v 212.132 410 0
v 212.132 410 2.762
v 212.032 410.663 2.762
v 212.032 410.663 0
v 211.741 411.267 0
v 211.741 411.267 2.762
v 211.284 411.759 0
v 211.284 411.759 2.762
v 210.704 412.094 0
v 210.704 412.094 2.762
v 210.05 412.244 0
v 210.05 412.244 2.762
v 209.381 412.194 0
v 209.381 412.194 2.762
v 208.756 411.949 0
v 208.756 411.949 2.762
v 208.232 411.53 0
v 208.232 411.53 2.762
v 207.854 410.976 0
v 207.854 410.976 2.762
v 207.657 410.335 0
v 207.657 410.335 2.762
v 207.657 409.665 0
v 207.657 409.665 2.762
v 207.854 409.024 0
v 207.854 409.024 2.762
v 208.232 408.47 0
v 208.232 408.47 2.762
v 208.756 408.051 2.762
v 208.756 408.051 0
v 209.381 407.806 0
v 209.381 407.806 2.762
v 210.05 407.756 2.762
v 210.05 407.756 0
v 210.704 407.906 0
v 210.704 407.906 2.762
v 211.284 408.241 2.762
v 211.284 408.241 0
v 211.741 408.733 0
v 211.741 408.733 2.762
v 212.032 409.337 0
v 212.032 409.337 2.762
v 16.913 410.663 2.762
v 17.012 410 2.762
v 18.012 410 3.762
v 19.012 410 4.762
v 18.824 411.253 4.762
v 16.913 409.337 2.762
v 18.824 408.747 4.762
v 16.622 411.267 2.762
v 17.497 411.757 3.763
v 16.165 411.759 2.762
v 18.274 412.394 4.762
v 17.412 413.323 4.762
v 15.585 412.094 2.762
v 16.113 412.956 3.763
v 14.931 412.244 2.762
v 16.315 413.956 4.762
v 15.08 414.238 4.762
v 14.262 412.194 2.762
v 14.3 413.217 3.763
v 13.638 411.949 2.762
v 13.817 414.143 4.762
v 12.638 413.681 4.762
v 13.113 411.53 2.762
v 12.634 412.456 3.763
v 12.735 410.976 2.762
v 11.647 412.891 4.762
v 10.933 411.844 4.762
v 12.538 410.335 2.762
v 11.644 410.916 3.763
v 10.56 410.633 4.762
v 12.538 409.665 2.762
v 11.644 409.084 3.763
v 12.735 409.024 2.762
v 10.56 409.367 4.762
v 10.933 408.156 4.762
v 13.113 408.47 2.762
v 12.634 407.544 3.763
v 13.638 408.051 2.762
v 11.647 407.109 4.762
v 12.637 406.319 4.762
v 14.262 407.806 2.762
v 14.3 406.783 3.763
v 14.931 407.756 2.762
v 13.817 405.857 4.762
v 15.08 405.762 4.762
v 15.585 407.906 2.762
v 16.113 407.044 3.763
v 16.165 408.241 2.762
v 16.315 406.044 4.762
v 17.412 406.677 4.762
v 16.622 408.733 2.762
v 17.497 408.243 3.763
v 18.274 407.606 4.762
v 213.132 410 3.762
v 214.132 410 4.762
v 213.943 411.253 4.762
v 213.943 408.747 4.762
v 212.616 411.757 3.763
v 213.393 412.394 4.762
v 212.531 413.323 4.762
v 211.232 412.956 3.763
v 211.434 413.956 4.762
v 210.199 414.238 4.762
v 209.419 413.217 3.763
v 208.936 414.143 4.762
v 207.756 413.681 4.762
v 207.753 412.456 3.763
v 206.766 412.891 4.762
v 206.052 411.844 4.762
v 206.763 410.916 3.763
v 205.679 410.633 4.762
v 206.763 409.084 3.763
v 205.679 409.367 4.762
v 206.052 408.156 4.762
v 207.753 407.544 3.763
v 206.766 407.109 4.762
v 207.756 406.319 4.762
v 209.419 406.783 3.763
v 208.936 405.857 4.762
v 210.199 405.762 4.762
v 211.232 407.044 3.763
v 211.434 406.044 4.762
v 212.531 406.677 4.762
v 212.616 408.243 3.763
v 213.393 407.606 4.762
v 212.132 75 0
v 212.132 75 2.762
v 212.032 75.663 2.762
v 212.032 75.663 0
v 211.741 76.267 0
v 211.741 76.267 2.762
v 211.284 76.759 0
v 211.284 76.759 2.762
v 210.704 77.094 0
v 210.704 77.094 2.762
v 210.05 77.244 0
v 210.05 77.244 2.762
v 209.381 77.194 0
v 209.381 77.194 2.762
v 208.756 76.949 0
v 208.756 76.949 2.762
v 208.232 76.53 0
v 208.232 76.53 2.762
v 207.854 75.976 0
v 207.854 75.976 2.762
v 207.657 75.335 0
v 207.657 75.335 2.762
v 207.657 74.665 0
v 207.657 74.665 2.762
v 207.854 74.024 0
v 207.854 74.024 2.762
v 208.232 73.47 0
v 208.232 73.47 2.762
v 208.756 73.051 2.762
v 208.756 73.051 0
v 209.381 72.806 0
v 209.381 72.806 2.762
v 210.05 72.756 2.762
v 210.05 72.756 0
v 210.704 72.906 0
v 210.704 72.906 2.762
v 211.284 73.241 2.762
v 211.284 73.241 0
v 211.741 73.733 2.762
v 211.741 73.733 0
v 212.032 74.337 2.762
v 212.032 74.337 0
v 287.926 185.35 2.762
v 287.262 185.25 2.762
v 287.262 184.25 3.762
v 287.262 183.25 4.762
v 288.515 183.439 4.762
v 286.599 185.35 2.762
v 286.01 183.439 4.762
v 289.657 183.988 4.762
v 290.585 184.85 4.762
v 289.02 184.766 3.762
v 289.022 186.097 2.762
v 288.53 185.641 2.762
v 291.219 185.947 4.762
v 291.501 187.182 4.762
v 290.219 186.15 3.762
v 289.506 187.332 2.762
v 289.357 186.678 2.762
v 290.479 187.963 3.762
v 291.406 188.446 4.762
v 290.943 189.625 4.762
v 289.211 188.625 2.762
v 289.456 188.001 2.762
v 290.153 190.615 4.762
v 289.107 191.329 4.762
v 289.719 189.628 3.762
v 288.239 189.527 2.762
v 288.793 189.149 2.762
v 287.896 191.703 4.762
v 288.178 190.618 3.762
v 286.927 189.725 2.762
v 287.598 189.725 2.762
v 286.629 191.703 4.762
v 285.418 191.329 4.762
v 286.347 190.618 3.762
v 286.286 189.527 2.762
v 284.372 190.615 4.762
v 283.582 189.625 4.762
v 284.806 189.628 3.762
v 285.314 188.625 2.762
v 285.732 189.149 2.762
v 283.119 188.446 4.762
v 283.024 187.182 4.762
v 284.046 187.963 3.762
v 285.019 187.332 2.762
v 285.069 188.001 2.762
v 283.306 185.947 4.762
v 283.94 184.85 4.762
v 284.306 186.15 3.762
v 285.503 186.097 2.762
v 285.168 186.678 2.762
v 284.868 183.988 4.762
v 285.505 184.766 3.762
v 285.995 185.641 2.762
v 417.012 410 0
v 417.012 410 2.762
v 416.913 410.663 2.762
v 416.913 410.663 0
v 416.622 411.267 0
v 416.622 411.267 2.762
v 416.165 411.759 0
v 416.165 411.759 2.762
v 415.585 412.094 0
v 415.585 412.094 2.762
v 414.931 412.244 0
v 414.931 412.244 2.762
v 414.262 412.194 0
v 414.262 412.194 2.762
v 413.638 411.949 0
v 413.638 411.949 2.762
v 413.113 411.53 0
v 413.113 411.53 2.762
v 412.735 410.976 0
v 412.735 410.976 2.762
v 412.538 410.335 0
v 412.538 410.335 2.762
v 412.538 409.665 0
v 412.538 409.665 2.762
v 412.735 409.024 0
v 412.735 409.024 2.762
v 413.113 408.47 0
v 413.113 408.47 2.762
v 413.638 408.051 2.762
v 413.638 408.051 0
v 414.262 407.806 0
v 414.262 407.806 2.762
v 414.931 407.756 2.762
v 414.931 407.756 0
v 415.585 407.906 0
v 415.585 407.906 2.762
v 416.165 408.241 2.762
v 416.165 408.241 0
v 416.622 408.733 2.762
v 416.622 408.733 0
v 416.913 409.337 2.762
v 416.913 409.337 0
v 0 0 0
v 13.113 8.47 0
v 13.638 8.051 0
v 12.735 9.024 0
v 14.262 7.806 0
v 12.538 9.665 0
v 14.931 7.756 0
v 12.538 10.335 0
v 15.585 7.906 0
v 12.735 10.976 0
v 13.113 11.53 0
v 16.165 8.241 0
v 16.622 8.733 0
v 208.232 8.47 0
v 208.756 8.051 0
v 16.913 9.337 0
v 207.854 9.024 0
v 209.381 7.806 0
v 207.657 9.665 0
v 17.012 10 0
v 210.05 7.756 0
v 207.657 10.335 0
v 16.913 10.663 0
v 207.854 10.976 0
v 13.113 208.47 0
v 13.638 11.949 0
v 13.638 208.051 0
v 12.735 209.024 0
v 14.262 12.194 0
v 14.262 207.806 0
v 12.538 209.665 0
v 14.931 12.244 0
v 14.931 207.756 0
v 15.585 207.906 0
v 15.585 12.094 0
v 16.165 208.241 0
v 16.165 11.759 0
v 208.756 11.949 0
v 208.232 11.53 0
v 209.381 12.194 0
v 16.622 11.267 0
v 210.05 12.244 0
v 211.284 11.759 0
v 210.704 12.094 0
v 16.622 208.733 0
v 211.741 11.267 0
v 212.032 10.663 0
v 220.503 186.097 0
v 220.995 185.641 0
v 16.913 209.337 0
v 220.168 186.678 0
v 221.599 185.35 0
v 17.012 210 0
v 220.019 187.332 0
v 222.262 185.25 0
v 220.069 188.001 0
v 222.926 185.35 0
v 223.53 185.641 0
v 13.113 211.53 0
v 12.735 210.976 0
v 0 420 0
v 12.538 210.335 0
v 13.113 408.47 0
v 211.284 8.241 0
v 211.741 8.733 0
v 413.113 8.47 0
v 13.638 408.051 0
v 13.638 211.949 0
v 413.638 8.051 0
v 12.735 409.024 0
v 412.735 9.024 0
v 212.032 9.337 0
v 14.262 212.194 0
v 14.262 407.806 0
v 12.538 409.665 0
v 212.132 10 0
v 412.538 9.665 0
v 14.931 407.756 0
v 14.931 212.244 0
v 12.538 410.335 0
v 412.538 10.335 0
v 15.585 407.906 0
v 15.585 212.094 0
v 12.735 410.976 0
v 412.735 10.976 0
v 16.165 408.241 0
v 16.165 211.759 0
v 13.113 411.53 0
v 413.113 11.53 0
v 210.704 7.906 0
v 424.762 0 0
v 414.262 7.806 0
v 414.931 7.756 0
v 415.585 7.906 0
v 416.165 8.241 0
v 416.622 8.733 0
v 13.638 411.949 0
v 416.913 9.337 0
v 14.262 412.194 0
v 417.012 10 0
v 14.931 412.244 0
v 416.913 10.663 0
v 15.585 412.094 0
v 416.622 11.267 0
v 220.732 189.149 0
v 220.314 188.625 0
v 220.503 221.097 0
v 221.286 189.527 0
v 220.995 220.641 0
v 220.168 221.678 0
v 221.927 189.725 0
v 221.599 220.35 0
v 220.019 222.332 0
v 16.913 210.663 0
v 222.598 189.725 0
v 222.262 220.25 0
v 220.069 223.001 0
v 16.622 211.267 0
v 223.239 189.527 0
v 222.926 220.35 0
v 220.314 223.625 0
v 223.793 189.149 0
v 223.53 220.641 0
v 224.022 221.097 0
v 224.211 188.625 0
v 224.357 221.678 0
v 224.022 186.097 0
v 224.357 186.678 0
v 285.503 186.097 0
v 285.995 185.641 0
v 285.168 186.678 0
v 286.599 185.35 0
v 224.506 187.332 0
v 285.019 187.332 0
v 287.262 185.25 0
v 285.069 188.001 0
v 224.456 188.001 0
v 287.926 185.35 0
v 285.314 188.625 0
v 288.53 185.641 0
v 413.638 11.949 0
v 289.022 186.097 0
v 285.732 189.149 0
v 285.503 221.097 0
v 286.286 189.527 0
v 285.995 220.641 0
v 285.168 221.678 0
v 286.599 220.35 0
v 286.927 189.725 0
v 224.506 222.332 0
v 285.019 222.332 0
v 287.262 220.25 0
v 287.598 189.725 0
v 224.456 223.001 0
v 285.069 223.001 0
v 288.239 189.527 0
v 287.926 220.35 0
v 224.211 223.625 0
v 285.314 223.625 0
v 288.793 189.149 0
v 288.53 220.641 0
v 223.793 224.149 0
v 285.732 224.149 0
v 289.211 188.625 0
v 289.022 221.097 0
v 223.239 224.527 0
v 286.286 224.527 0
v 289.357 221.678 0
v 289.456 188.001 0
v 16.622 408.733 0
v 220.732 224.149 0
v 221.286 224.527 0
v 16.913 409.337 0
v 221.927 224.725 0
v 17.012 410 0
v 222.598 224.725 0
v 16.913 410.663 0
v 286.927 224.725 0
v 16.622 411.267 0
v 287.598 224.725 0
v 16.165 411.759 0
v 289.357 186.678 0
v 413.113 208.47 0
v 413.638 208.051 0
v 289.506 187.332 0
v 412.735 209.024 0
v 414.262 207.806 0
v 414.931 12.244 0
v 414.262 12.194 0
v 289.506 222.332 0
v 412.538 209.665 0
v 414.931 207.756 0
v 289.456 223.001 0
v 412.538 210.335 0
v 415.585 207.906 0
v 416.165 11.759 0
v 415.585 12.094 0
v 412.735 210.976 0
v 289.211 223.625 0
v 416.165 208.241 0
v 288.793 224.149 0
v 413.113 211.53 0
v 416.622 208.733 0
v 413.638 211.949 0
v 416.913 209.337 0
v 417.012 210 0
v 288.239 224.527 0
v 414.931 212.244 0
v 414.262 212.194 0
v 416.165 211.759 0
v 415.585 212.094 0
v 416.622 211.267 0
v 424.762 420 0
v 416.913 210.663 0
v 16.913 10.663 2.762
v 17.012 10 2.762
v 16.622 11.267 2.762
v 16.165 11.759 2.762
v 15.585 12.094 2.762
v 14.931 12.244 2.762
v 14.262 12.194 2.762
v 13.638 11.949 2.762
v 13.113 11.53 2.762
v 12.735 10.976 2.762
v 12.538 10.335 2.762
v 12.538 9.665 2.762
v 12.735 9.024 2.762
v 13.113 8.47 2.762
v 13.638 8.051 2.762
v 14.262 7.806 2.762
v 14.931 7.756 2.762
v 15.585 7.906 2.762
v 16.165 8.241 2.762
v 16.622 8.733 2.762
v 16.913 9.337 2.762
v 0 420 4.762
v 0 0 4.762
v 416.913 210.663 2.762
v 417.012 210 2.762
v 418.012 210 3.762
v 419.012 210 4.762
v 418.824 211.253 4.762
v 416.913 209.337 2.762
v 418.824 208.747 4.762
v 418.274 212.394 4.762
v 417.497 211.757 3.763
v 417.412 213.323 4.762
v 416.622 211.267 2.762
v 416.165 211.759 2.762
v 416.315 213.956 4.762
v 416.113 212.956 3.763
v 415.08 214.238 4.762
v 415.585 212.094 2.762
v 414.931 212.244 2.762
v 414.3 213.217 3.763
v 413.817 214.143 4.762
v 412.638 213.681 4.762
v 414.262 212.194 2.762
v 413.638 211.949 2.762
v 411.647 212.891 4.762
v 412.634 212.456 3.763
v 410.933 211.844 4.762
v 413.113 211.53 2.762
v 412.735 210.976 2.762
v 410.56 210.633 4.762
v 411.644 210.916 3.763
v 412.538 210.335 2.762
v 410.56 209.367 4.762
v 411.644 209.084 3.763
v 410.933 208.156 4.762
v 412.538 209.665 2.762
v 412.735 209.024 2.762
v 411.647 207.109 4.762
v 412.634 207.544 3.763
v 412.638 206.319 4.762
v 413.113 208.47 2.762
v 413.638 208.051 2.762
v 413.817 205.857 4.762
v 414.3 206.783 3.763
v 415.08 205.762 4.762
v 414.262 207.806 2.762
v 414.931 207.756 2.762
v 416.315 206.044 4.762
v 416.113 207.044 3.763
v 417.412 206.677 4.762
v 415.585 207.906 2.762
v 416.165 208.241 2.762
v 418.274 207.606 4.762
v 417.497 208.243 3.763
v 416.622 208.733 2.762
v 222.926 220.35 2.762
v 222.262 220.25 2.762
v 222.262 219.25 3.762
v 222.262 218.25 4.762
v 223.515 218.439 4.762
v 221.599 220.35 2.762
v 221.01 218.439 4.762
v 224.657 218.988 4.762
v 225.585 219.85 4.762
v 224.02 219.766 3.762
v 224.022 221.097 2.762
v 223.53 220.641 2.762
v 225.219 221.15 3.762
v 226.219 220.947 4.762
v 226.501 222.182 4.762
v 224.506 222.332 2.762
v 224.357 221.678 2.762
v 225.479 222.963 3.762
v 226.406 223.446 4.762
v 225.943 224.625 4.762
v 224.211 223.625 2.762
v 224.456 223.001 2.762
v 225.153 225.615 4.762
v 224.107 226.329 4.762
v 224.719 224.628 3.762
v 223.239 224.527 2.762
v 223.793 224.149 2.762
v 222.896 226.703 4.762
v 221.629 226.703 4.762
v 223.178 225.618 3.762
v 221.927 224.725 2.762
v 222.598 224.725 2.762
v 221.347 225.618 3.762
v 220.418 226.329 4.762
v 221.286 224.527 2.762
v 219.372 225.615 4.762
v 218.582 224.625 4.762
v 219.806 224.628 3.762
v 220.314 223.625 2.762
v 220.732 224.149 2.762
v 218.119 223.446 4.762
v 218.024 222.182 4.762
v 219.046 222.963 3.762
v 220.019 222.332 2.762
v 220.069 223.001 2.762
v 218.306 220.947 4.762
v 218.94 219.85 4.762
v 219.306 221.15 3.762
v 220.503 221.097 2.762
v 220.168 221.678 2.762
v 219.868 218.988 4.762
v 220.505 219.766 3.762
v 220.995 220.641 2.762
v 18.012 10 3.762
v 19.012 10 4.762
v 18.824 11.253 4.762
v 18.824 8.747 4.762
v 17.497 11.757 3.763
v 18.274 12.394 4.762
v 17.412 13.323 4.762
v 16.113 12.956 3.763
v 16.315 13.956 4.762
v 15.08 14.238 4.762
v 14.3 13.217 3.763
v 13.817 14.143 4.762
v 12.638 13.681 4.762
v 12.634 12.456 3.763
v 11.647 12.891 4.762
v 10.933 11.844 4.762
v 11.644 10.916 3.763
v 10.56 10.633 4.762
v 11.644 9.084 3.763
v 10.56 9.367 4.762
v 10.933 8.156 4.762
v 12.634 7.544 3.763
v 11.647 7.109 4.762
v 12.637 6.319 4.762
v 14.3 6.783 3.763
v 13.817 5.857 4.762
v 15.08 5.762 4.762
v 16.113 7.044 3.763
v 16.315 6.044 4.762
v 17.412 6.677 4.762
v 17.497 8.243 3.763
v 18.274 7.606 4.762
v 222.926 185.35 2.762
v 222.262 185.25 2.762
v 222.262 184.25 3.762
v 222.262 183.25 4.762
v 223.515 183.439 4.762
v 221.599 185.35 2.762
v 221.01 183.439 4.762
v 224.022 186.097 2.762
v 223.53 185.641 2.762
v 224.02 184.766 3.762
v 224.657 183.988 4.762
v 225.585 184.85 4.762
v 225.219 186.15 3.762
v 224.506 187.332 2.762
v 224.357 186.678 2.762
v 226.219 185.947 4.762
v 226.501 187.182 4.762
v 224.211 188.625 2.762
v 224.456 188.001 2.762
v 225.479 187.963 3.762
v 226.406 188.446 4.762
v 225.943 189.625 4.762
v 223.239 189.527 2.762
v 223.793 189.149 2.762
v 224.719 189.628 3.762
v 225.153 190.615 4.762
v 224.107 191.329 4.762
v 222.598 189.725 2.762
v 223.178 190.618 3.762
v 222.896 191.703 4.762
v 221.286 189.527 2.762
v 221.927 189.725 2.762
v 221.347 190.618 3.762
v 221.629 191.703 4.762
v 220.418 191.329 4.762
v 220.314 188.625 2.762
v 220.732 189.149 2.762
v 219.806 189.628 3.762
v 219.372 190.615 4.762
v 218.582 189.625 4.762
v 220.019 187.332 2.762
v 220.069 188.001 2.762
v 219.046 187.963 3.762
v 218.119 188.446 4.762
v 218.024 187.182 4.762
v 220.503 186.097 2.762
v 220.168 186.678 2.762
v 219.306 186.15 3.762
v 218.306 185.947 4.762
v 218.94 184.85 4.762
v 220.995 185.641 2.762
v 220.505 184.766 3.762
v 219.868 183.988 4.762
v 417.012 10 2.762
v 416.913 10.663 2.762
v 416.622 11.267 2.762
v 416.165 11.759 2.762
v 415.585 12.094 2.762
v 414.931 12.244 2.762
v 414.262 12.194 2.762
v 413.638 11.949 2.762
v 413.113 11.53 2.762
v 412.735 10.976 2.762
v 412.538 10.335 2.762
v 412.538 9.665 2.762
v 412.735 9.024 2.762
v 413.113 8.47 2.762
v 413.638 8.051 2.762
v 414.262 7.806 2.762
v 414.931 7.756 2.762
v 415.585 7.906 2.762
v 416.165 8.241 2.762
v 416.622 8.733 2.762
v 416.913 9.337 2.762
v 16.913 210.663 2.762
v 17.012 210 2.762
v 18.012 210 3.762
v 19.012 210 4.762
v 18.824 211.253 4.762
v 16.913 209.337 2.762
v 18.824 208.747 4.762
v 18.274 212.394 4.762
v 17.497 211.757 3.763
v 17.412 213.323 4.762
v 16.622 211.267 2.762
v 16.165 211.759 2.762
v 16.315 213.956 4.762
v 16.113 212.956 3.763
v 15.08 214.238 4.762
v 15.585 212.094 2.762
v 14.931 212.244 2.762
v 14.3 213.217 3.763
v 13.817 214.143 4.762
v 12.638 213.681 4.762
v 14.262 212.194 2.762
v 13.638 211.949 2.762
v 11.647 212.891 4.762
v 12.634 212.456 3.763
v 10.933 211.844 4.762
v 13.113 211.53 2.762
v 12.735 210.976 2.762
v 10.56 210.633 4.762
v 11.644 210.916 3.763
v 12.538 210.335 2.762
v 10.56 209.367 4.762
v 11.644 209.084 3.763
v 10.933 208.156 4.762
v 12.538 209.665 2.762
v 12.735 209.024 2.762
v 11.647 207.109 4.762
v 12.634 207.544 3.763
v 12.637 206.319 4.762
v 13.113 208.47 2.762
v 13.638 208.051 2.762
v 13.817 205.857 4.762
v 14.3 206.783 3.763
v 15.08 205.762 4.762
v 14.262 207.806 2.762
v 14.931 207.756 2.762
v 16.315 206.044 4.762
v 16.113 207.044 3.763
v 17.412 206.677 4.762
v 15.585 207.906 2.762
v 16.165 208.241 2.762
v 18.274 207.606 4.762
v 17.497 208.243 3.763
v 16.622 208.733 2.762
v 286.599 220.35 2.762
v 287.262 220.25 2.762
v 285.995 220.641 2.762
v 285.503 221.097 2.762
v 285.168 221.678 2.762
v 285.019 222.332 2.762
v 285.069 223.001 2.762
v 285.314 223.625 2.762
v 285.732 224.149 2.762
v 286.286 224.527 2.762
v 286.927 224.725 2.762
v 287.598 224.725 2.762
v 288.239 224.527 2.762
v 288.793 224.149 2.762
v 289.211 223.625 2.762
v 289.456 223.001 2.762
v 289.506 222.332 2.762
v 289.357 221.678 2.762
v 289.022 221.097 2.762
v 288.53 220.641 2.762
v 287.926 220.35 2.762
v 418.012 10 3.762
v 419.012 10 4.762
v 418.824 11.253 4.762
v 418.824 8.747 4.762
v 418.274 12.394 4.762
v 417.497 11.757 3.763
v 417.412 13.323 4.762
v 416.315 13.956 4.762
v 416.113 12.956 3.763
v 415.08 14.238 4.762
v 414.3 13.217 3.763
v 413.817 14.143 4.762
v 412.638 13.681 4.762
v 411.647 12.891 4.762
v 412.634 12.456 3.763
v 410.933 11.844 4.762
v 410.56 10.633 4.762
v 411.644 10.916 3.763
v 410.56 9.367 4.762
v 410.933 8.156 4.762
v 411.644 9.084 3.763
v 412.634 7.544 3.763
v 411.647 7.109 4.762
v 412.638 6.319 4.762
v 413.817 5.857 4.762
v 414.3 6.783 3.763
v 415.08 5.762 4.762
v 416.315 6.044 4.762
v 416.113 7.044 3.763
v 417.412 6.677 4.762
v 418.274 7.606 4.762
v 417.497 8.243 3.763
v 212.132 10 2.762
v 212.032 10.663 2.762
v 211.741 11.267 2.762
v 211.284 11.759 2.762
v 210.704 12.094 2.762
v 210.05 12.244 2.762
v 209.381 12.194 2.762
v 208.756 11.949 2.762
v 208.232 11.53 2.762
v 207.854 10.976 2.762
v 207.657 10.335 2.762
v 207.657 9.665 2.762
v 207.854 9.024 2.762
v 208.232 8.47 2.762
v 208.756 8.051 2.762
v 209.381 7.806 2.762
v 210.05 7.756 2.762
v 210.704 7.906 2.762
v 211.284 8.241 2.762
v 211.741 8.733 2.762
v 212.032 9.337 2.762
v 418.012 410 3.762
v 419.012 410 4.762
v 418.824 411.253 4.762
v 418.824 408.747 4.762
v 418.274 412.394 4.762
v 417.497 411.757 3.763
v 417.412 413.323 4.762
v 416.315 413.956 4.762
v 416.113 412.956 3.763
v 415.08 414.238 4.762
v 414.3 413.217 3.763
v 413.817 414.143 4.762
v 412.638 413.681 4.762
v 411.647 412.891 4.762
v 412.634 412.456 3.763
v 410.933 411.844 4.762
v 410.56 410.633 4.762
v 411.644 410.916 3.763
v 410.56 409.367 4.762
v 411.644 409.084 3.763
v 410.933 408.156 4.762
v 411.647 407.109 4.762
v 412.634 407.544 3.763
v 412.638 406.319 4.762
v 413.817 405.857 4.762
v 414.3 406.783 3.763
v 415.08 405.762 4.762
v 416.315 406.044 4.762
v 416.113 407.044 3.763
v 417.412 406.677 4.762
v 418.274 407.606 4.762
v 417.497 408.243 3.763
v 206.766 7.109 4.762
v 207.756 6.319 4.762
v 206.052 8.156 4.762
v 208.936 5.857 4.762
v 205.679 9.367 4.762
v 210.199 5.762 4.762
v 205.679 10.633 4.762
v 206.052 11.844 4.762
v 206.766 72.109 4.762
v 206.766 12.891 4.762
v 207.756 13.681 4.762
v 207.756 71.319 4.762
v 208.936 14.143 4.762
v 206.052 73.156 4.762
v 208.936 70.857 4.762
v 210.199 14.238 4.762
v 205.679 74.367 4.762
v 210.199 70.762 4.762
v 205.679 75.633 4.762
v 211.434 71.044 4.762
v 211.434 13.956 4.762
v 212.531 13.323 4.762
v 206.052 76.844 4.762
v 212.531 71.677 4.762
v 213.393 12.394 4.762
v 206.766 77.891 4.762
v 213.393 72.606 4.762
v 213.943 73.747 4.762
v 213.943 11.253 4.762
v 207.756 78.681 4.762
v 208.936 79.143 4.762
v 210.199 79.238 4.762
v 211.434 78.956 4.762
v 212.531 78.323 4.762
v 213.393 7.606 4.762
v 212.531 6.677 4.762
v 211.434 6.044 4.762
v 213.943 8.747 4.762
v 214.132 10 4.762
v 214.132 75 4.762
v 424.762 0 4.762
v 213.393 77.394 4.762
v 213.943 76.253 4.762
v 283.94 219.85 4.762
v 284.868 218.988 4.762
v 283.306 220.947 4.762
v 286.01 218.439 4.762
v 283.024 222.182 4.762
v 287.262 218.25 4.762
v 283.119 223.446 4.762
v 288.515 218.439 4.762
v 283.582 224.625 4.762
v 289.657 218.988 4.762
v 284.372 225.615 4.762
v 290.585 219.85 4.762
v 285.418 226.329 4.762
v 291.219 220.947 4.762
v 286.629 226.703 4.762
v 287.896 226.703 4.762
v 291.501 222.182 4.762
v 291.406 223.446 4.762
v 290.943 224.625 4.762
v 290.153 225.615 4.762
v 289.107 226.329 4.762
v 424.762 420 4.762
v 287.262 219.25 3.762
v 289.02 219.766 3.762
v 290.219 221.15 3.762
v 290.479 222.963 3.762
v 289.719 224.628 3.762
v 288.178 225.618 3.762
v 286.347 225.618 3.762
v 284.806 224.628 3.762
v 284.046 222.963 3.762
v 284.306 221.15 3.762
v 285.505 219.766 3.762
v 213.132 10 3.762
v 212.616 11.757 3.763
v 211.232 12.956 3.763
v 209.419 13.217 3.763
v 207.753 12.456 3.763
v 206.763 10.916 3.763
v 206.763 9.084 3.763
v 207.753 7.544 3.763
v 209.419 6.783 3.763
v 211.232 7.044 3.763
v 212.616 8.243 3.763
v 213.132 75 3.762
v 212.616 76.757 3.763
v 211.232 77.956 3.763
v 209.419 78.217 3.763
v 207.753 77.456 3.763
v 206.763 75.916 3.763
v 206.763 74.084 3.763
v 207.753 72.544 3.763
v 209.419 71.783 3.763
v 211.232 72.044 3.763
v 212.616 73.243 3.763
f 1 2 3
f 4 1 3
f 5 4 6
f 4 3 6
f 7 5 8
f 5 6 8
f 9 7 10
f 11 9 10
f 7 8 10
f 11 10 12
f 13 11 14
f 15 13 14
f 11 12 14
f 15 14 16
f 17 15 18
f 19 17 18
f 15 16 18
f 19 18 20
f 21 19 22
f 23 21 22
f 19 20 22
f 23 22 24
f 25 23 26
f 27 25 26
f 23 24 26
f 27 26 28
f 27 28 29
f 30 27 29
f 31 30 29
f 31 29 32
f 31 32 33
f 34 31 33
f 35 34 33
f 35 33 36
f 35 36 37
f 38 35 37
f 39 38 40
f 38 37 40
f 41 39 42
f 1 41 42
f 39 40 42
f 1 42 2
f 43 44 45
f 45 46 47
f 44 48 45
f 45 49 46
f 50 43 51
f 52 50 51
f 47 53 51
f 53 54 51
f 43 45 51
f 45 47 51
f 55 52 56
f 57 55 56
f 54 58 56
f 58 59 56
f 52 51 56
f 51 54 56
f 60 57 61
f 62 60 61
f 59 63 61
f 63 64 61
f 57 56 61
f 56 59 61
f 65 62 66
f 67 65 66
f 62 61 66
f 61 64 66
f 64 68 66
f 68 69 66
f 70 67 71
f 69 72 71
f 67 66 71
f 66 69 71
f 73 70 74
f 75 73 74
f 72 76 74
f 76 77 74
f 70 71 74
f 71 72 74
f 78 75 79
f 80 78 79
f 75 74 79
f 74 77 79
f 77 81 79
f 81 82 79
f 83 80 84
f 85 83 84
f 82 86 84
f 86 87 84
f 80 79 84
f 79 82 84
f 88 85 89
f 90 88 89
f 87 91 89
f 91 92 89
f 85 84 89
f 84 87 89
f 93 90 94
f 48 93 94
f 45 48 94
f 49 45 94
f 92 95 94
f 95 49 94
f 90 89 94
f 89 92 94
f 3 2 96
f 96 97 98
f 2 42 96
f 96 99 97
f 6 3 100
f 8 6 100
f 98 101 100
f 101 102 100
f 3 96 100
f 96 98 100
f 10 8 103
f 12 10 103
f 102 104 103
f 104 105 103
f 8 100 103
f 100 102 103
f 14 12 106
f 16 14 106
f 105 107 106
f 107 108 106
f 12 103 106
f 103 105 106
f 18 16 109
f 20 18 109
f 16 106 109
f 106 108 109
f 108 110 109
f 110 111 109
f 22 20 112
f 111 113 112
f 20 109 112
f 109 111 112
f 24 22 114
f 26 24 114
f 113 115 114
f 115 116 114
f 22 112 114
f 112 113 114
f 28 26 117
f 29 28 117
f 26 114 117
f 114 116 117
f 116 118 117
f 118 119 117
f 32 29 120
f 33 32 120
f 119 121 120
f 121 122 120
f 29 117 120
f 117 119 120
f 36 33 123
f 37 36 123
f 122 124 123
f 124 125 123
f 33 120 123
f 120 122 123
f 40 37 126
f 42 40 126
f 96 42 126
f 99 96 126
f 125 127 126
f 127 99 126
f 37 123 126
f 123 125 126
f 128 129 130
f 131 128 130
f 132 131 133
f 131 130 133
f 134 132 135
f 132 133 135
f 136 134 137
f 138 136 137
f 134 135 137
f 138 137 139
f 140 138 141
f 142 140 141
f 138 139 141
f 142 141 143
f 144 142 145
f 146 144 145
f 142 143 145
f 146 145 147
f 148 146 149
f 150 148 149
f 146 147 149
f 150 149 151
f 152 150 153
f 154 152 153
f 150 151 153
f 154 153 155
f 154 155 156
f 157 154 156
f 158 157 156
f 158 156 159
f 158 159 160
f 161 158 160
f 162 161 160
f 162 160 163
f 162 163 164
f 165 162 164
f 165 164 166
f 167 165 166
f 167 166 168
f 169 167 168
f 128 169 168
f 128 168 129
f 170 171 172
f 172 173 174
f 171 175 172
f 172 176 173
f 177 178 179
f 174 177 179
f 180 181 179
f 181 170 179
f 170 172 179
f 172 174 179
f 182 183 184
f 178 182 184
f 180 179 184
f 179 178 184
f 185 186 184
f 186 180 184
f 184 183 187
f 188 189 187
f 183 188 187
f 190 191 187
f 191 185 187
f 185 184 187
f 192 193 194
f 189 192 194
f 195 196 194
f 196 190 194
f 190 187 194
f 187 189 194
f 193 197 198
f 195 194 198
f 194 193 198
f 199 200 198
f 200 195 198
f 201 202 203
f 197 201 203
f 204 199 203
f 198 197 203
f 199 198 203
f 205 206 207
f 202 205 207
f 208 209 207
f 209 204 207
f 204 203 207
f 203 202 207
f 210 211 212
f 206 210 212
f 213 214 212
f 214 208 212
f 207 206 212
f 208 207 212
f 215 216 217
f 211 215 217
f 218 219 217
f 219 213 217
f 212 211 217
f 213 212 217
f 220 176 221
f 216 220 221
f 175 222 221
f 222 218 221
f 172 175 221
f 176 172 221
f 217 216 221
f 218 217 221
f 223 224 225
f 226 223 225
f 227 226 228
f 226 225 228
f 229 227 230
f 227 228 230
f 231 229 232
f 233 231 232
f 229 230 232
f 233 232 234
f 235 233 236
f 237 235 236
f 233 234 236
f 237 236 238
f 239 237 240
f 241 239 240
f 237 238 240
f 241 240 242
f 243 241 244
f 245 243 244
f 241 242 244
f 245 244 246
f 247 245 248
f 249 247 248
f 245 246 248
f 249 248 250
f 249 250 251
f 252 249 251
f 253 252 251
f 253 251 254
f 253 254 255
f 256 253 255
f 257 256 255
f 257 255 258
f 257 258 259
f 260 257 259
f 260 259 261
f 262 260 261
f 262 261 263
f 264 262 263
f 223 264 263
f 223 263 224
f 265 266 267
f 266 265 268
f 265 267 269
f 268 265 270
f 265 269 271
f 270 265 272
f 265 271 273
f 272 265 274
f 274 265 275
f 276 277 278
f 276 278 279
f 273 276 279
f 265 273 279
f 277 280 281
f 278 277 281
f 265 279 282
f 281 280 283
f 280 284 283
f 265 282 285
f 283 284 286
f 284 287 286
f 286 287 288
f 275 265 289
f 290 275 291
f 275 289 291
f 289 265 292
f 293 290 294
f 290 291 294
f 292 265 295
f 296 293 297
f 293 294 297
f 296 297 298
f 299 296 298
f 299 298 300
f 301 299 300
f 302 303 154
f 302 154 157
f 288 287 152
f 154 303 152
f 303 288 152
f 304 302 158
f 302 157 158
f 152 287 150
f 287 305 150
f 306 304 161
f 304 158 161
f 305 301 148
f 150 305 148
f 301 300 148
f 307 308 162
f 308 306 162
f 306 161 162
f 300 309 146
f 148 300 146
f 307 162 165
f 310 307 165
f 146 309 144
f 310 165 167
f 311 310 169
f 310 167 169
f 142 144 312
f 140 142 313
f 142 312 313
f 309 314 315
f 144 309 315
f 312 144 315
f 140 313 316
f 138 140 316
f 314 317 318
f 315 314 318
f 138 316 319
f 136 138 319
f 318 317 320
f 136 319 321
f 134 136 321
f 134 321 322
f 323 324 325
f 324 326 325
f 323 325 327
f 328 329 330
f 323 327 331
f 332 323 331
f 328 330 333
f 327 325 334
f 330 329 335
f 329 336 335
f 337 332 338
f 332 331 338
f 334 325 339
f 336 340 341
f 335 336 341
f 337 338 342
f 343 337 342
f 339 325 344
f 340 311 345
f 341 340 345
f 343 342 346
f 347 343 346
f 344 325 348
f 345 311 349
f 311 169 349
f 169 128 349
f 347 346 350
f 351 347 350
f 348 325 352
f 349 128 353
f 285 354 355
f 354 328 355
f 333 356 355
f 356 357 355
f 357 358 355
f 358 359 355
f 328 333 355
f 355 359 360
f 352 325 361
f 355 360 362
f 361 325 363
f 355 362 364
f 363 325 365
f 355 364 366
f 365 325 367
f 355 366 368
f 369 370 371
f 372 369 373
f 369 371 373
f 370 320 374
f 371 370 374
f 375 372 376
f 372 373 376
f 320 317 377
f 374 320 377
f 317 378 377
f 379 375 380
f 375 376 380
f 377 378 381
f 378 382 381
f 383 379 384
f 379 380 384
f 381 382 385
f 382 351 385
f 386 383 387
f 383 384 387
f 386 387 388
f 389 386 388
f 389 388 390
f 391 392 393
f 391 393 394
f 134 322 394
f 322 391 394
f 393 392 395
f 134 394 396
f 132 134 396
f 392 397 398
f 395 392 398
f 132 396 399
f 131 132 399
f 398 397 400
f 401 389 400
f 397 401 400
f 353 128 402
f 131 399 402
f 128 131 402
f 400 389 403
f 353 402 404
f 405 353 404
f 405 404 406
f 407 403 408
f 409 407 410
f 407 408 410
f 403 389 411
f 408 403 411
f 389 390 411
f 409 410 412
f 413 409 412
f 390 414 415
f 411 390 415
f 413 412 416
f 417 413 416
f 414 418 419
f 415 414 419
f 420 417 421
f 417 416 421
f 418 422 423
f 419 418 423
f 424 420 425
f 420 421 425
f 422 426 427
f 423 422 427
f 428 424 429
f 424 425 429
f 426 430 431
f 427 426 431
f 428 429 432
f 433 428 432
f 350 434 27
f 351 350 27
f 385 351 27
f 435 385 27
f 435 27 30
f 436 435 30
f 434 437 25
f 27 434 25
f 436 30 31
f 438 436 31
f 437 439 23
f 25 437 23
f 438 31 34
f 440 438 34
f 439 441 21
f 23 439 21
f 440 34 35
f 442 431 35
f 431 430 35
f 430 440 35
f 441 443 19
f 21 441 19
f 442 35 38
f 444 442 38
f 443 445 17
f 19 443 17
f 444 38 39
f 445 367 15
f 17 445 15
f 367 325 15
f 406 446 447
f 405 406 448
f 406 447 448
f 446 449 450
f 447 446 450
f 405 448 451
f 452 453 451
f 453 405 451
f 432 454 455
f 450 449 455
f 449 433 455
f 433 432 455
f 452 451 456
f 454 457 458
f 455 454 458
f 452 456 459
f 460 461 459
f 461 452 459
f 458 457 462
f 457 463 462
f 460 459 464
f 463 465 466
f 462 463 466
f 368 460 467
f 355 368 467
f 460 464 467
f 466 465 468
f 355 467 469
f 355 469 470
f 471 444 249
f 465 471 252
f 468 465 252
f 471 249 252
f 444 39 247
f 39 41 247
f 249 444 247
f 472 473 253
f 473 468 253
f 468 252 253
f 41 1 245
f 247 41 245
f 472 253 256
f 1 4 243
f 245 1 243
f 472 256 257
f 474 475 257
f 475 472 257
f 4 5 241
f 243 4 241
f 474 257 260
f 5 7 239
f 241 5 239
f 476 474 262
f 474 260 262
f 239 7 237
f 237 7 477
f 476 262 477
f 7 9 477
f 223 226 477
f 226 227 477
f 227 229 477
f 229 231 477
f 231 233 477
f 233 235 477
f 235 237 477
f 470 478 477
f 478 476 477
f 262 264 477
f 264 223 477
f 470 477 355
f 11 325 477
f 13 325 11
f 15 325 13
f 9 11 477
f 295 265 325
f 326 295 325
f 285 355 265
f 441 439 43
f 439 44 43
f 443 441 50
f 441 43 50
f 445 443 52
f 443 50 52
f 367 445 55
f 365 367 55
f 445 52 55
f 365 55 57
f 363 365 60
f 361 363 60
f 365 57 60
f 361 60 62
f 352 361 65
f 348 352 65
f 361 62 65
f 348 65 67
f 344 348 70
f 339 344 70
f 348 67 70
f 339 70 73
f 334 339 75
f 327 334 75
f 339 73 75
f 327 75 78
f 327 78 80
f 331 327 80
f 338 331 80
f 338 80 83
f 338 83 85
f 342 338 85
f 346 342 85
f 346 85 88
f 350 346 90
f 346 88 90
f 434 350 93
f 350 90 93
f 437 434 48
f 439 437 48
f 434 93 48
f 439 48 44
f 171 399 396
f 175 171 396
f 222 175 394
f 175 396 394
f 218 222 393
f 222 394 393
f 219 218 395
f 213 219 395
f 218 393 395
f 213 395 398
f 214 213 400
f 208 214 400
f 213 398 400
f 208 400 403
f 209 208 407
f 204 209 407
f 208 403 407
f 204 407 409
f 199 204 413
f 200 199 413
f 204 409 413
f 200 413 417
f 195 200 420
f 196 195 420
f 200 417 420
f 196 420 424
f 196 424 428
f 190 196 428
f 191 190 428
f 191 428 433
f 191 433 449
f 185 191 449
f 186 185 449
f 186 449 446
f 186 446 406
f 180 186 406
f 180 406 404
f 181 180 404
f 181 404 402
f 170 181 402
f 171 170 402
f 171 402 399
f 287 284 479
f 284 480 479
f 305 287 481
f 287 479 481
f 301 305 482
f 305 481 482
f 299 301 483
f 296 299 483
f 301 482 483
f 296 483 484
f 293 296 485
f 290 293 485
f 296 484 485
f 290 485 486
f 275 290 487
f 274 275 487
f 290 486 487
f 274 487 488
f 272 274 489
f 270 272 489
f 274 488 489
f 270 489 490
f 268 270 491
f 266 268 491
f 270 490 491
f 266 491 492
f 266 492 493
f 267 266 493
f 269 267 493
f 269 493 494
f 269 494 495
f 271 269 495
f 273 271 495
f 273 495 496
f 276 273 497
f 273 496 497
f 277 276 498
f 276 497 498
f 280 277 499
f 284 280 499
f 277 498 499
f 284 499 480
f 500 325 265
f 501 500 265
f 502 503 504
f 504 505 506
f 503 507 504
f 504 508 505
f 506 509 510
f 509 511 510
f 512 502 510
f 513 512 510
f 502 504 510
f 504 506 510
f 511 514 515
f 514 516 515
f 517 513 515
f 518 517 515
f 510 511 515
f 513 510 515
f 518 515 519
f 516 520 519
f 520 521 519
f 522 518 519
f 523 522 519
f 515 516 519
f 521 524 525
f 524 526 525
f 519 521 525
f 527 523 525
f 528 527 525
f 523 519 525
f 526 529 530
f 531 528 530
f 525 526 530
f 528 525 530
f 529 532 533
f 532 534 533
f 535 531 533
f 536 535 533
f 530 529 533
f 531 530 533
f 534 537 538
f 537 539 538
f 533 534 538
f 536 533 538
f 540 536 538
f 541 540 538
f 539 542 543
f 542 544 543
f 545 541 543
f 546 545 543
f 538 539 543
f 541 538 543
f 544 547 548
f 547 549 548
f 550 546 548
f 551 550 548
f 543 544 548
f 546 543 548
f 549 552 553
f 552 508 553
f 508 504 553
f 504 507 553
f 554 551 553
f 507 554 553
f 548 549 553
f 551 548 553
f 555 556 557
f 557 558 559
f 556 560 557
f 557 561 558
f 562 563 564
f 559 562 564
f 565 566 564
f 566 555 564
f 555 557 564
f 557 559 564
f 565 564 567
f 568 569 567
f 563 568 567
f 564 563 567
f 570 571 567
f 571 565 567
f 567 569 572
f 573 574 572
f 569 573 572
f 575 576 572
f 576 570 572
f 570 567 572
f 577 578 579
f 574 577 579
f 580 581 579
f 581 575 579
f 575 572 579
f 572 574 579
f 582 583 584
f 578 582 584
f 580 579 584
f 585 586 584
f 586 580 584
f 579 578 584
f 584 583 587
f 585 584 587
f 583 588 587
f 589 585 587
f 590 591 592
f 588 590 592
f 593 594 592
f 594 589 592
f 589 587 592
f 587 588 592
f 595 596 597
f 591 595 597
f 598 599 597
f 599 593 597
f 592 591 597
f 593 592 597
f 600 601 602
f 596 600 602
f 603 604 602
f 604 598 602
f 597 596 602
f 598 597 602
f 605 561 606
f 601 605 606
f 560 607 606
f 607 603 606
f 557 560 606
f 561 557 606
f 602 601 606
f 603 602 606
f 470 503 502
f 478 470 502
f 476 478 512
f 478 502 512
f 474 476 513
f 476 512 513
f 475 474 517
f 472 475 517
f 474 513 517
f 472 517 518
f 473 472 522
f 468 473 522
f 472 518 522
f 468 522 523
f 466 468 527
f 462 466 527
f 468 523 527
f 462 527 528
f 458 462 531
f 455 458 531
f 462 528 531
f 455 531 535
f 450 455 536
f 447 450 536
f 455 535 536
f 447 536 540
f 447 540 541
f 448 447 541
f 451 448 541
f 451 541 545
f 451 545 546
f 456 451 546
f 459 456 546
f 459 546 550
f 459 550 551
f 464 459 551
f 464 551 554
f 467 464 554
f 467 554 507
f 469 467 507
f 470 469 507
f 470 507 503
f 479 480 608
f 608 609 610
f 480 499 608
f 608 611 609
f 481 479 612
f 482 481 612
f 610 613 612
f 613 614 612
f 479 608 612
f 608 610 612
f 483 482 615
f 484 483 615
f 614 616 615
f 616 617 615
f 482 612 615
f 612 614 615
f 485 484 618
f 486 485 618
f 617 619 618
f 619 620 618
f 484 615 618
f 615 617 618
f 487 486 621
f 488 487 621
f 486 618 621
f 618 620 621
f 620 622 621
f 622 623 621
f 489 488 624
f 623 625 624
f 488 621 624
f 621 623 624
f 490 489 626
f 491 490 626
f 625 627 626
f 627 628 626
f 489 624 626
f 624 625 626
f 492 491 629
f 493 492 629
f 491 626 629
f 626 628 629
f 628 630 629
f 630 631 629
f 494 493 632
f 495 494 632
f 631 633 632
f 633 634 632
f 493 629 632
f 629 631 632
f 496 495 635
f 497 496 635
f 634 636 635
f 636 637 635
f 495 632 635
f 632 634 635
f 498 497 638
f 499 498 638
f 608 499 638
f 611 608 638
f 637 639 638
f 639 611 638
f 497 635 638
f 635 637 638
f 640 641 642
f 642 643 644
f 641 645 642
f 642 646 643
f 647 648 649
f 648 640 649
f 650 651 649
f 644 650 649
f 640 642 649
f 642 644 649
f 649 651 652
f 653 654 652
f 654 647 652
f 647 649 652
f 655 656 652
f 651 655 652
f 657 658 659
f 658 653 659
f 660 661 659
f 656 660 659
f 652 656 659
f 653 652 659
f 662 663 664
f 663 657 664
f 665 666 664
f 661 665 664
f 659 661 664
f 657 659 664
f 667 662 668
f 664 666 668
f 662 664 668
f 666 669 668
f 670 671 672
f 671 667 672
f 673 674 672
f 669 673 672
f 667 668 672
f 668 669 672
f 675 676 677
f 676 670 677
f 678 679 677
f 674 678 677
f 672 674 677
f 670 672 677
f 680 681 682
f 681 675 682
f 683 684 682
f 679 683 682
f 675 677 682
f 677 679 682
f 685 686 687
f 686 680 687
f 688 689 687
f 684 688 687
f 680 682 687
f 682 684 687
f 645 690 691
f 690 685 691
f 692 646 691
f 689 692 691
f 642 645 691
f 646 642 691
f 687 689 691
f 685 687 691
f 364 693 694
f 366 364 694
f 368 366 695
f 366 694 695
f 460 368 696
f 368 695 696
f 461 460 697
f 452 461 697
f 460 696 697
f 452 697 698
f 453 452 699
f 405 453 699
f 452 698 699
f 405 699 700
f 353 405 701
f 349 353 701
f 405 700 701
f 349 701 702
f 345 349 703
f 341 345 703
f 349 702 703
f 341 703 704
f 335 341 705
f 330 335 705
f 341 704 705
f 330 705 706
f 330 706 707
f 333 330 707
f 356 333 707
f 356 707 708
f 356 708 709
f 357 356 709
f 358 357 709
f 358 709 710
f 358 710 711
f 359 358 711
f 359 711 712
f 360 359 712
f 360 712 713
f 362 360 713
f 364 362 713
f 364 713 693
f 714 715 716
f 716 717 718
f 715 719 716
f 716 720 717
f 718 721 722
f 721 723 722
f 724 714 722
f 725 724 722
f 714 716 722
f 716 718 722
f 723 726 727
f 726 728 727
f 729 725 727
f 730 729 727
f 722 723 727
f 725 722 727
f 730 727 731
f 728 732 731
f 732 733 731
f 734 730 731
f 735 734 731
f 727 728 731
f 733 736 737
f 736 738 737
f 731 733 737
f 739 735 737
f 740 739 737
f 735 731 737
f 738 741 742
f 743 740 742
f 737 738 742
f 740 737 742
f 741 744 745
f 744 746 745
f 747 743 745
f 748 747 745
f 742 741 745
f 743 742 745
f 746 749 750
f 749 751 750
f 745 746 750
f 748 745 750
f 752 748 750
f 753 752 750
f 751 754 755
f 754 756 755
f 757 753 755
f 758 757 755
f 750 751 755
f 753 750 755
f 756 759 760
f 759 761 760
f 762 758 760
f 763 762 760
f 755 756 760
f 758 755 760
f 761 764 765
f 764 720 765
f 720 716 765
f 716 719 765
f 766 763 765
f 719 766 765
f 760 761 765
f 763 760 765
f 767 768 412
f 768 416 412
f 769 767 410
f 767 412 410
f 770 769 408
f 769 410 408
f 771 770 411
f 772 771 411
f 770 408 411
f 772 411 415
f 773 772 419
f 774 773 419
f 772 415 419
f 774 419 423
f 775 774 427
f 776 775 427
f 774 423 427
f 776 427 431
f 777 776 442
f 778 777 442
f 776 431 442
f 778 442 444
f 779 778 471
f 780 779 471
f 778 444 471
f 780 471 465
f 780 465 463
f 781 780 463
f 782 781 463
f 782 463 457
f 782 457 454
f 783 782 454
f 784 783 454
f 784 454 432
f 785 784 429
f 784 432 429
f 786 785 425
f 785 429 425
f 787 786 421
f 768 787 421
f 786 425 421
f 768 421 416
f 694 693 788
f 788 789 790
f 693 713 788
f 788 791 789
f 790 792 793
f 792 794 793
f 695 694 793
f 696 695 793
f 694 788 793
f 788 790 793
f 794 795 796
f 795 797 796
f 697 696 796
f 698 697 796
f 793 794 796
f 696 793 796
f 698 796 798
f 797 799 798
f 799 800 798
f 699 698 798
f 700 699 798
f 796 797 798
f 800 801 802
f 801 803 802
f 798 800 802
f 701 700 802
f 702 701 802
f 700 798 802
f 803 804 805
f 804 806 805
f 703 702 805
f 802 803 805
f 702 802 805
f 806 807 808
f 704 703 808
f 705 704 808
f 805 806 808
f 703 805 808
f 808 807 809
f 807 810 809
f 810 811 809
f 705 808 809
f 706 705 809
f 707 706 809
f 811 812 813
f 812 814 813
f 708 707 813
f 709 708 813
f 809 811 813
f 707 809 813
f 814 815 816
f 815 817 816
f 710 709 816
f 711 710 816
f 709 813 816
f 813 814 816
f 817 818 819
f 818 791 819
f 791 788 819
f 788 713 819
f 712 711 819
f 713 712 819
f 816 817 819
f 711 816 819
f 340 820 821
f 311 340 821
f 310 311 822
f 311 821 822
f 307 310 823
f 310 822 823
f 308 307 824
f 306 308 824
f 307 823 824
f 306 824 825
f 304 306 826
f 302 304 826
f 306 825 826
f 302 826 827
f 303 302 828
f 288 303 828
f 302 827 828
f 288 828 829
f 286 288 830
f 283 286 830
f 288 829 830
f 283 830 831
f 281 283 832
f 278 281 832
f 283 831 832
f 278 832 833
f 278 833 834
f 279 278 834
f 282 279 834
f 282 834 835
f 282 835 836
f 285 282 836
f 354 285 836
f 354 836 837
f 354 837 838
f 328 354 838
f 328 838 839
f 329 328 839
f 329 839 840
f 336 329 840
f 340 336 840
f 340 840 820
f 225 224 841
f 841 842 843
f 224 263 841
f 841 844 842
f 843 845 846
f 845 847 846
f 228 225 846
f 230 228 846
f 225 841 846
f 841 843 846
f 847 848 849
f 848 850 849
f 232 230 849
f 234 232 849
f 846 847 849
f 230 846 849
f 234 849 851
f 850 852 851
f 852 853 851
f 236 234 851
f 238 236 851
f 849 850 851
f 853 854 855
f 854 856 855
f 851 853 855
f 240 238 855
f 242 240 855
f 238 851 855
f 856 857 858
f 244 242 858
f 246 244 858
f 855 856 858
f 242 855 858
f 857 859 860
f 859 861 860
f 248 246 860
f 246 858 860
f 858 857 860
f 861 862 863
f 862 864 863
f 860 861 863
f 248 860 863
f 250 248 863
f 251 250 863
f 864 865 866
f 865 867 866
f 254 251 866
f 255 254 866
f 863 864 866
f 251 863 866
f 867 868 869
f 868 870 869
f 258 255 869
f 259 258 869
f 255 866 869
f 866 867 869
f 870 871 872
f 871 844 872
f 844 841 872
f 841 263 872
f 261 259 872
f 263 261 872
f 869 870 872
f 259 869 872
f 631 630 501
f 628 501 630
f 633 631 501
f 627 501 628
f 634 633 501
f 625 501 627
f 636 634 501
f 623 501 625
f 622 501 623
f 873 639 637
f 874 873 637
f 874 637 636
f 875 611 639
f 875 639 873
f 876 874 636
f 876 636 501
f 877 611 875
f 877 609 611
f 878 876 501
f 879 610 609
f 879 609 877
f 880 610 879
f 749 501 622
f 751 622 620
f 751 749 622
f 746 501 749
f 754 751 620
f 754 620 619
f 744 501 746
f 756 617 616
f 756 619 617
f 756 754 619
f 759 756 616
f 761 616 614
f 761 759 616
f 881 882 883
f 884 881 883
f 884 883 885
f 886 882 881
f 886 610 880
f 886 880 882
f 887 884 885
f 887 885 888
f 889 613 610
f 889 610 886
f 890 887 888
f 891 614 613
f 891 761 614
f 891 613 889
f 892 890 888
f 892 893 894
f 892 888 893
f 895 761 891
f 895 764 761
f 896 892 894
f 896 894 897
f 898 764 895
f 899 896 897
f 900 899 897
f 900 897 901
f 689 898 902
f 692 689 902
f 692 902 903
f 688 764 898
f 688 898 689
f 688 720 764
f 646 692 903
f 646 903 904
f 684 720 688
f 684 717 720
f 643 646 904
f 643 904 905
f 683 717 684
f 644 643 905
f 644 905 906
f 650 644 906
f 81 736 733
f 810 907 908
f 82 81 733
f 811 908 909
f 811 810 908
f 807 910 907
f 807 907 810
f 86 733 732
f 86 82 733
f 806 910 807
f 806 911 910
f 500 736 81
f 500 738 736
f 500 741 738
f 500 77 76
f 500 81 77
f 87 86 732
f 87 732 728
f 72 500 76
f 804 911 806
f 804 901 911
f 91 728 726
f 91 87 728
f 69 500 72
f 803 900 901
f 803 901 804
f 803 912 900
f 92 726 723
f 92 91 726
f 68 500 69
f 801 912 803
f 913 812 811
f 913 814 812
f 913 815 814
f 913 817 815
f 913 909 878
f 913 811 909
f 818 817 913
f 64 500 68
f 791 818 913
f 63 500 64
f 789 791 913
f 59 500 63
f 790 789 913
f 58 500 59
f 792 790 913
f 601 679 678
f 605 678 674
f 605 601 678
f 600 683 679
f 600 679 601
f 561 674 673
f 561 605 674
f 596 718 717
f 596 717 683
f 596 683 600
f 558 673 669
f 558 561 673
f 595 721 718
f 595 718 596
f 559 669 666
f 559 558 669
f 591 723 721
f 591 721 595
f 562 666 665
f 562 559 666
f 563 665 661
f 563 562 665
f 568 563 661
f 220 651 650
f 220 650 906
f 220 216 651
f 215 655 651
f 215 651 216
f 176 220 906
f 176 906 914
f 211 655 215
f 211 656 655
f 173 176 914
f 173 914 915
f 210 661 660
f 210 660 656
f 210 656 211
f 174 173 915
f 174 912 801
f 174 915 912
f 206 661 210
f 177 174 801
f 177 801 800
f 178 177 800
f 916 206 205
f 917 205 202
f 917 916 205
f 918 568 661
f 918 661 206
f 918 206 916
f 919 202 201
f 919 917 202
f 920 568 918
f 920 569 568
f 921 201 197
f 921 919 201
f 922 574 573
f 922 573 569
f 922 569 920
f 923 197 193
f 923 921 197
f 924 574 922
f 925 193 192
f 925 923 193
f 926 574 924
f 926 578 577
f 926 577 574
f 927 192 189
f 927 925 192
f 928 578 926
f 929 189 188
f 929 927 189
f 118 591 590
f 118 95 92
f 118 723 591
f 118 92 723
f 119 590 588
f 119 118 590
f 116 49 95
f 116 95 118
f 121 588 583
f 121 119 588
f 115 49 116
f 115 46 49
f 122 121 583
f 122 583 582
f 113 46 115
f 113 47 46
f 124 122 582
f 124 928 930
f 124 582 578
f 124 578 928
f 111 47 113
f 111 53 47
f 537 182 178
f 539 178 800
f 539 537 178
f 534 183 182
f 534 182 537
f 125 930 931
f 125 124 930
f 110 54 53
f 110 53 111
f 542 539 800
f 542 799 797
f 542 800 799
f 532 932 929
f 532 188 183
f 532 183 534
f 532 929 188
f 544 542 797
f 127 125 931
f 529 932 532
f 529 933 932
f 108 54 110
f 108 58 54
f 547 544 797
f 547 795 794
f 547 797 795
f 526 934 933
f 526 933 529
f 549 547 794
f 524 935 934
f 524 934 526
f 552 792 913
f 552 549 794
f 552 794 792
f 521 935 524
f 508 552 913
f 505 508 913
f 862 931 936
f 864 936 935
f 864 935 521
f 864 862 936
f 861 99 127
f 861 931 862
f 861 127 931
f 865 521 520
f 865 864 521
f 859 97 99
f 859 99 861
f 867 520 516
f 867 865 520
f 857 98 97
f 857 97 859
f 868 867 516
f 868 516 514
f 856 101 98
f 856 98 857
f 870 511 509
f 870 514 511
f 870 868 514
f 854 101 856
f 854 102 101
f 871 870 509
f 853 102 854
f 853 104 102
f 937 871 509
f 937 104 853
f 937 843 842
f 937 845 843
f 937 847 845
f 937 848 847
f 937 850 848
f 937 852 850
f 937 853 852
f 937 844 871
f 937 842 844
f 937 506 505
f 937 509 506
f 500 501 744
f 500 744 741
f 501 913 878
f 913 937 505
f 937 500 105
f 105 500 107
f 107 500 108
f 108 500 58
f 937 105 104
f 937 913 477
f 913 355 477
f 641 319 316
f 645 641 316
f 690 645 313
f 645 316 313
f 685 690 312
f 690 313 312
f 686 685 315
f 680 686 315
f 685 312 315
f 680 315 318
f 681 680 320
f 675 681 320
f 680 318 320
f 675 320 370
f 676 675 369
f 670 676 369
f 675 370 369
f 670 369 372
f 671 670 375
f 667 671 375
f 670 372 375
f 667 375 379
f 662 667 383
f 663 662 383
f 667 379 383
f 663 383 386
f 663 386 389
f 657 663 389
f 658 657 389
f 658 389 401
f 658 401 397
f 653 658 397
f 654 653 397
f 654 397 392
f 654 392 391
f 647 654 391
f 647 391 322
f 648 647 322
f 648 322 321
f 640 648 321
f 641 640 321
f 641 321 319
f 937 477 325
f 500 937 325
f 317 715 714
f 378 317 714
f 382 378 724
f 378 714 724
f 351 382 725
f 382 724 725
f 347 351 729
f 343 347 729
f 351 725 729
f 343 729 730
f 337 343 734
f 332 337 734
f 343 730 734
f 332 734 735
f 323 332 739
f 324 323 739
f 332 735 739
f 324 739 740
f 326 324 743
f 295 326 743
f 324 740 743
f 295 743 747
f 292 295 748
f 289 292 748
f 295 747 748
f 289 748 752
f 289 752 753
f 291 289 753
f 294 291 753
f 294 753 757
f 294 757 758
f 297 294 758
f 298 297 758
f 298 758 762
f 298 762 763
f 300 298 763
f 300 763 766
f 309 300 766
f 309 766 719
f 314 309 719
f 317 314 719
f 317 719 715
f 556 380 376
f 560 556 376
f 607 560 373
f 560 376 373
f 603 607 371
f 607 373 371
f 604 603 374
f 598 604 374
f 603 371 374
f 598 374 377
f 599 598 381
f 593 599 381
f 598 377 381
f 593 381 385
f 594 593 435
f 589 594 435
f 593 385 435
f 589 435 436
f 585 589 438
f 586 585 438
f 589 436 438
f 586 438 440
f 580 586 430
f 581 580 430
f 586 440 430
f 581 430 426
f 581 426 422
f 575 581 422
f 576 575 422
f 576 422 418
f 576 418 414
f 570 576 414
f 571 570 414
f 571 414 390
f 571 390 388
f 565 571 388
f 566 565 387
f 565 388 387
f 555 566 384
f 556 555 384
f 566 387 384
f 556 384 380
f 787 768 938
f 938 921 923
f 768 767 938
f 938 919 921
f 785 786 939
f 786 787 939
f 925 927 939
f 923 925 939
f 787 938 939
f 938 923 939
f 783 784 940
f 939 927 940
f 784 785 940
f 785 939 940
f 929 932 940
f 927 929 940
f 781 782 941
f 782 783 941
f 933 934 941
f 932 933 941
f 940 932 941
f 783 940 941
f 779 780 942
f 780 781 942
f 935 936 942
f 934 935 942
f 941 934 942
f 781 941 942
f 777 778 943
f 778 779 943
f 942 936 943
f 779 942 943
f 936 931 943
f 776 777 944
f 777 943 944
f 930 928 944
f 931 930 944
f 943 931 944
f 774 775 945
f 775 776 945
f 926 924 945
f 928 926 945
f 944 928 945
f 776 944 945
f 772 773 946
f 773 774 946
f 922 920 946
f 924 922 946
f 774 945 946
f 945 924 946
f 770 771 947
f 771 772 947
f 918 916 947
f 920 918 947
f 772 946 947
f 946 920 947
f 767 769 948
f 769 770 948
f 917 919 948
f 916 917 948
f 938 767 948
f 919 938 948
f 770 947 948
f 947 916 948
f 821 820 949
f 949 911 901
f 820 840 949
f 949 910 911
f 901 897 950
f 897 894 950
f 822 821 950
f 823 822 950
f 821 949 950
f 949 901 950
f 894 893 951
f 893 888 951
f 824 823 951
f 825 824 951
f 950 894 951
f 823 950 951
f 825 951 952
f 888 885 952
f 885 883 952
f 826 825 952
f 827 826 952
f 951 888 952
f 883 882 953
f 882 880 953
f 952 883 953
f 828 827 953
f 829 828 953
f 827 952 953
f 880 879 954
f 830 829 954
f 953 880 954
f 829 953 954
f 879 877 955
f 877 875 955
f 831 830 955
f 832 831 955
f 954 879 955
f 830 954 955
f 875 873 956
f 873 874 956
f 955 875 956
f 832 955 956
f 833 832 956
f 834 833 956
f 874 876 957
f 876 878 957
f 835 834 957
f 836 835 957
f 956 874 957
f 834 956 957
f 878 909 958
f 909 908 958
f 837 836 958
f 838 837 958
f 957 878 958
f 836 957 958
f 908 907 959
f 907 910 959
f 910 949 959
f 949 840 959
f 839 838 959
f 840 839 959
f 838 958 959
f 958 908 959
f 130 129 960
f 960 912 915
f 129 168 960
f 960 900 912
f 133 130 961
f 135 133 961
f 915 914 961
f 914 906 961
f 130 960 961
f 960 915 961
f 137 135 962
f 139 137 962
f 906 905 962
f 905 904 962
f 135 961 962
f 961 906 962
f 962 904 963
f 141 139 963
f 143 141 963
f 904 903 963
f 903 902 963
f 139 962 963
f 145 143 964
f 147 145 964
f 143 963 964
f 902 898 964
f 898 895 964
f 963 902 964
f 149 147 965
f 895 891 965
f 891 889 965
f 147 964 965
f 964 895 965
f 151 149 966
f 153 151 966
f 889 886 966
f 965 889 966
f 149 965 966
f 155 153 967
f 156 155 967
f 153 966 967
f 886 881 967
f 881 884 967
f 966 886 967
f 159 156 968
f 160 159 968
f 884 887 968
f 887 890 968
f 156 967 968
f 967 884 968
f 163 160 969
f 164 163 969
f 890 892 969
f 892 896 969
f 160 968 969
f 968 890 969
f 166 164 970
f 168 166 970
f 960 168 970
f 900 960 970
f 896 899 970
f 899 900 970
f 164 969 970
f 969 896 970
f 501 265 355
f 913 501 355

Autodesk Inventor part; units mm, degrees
ref_plane "YZ Plane" through (0, 0, 0) normal (1, 0, 0) x (0, 1, 0)
ref_plane "XZ Plane" through (0, 0, 0) normal (0, 1, 0) x (-1, 0, 0)
ref_plane "XY Plane" through (0, 0, 0) normal (0, 0, 1) x (1, 0, 0)
sketch "Sketch1" plane through (0, 0, 0) normal (0, 0, 1) x (1, 0, 0)
  line L0 (0, 0) -> (424.7625, 0)
  line L1 (424.7625, 0) -> (424.7625, 420)
  line L2 (424.7625, 420) -> (0, 420)
  line L3 (0, 420) -> (0, 0)
  dimension "d0" = 424.7625
  dimension "d1" = 420
extrude "Extrusion1" add sketch "Sketch1" along normal blind 4.7625
sketch "Sketch6" plane through (0, 0, 4.7625) normal (0, 0, 1) x (1, 0, 0)
  line L0 (0, 0) -> (424.7625, 0) projected
  line L1 (424.7625, 0) -> (424.7625, 420) projected
  line L2 (424.7625, 420) -> (0, 420) projected
  line L3 (0, 420) -> (0, 0) projected
  circle A0 centre (14.7625, 410) radius 2.25
  circle A1 centre (414.7625, 410) radius 2.25
  circle A2 centre (14.7625, 10) radius 2.25
  circle A3 centre (414.7625, 10) radius 2.25
  circle A4 centre (14.7625, 210) radius 2.25
  circle A5 centre (414.7625, 210) radius 2.25
  circle A6 centre (209.8815, 410) radius 2.25
  circle A7 centre (209.8815, 10) radius 2.25
  circle A8 centre (209.8815, 75) radius 2.25
  dimension "d42" = 4.5
  dimension "d43" = 10
  dimension "d44" = 14.7625
  dimension "d45" = 10
  dimension "d46" = 10
  dimension "d47" = 10
  dimension "d48" = 210
  dimension "d51" = 209.8815
  dimension "d55" = 75
extrude "Extrusion3" cut sketch "Sketch6" against normal up to next contours A0 | A1 | A2 | A3 | A4 | A5 | A6 | A7 | A8
chamfer "Chamfer1" distance 2 angle 45 9 edges at (12.5125, 410, 4.7625) (207.6315, 410, 4.7625) (412.5125, 410, 4.7625) (412.5125, 210, 4.7625) (12.5125, 210, 4.7625) (12.5125, 10, 4.7625) (207.6315, 10, 4.7625) (412.5125, 10, 4.7625) (207.6315, 75, 4.7625)
sketch "Sketch7" plane through (0, 0, 4.7625) normal (0, 0, 1) x (1, 0, 0)
  line L0 (0, 0) -> (424.7625, 0) projected
  line L1 (424.7625, 0) -> (424.7625, 420) projected
  line L2 (424.7625, 420) -> (0, 420) projected
  line L3 (0, 420) -> (0, 0) projected
  line L4 (424.7625, 180) -> (0, 180) construction
  line L5 (424.7625, 420) -> (0, 420) construction
  line L6 (294.7625, 420) -> (294.7625, 0) construction
  point P0 (222.2625, 222.5)
  point P1 (287.2625, 222.5)
  point P2 (222.2625, 187.5)
  point P3 (287.2625, 187.5)
  dimension "d56" = 180
  dimension "d57" = 130
  dimension "d58" = 7.5
  dimension "d59" = 7.5
  dimension "d60" = 65
  dimension "d61" = 35
hole "Hole3" at (222.2625, 222.5, 4.7625) at (287.2625, 222.5, 4.7625) at (222.2625, 187.5, 4.7625) at (287.2625, 187.5, 4.7625) direction (0, 0, -1) diameter 4.5 end through all countersink diameter 8.5 countersink angle 90
properties part number "EnclosurePanelLeft" material "ABS Plastic"
